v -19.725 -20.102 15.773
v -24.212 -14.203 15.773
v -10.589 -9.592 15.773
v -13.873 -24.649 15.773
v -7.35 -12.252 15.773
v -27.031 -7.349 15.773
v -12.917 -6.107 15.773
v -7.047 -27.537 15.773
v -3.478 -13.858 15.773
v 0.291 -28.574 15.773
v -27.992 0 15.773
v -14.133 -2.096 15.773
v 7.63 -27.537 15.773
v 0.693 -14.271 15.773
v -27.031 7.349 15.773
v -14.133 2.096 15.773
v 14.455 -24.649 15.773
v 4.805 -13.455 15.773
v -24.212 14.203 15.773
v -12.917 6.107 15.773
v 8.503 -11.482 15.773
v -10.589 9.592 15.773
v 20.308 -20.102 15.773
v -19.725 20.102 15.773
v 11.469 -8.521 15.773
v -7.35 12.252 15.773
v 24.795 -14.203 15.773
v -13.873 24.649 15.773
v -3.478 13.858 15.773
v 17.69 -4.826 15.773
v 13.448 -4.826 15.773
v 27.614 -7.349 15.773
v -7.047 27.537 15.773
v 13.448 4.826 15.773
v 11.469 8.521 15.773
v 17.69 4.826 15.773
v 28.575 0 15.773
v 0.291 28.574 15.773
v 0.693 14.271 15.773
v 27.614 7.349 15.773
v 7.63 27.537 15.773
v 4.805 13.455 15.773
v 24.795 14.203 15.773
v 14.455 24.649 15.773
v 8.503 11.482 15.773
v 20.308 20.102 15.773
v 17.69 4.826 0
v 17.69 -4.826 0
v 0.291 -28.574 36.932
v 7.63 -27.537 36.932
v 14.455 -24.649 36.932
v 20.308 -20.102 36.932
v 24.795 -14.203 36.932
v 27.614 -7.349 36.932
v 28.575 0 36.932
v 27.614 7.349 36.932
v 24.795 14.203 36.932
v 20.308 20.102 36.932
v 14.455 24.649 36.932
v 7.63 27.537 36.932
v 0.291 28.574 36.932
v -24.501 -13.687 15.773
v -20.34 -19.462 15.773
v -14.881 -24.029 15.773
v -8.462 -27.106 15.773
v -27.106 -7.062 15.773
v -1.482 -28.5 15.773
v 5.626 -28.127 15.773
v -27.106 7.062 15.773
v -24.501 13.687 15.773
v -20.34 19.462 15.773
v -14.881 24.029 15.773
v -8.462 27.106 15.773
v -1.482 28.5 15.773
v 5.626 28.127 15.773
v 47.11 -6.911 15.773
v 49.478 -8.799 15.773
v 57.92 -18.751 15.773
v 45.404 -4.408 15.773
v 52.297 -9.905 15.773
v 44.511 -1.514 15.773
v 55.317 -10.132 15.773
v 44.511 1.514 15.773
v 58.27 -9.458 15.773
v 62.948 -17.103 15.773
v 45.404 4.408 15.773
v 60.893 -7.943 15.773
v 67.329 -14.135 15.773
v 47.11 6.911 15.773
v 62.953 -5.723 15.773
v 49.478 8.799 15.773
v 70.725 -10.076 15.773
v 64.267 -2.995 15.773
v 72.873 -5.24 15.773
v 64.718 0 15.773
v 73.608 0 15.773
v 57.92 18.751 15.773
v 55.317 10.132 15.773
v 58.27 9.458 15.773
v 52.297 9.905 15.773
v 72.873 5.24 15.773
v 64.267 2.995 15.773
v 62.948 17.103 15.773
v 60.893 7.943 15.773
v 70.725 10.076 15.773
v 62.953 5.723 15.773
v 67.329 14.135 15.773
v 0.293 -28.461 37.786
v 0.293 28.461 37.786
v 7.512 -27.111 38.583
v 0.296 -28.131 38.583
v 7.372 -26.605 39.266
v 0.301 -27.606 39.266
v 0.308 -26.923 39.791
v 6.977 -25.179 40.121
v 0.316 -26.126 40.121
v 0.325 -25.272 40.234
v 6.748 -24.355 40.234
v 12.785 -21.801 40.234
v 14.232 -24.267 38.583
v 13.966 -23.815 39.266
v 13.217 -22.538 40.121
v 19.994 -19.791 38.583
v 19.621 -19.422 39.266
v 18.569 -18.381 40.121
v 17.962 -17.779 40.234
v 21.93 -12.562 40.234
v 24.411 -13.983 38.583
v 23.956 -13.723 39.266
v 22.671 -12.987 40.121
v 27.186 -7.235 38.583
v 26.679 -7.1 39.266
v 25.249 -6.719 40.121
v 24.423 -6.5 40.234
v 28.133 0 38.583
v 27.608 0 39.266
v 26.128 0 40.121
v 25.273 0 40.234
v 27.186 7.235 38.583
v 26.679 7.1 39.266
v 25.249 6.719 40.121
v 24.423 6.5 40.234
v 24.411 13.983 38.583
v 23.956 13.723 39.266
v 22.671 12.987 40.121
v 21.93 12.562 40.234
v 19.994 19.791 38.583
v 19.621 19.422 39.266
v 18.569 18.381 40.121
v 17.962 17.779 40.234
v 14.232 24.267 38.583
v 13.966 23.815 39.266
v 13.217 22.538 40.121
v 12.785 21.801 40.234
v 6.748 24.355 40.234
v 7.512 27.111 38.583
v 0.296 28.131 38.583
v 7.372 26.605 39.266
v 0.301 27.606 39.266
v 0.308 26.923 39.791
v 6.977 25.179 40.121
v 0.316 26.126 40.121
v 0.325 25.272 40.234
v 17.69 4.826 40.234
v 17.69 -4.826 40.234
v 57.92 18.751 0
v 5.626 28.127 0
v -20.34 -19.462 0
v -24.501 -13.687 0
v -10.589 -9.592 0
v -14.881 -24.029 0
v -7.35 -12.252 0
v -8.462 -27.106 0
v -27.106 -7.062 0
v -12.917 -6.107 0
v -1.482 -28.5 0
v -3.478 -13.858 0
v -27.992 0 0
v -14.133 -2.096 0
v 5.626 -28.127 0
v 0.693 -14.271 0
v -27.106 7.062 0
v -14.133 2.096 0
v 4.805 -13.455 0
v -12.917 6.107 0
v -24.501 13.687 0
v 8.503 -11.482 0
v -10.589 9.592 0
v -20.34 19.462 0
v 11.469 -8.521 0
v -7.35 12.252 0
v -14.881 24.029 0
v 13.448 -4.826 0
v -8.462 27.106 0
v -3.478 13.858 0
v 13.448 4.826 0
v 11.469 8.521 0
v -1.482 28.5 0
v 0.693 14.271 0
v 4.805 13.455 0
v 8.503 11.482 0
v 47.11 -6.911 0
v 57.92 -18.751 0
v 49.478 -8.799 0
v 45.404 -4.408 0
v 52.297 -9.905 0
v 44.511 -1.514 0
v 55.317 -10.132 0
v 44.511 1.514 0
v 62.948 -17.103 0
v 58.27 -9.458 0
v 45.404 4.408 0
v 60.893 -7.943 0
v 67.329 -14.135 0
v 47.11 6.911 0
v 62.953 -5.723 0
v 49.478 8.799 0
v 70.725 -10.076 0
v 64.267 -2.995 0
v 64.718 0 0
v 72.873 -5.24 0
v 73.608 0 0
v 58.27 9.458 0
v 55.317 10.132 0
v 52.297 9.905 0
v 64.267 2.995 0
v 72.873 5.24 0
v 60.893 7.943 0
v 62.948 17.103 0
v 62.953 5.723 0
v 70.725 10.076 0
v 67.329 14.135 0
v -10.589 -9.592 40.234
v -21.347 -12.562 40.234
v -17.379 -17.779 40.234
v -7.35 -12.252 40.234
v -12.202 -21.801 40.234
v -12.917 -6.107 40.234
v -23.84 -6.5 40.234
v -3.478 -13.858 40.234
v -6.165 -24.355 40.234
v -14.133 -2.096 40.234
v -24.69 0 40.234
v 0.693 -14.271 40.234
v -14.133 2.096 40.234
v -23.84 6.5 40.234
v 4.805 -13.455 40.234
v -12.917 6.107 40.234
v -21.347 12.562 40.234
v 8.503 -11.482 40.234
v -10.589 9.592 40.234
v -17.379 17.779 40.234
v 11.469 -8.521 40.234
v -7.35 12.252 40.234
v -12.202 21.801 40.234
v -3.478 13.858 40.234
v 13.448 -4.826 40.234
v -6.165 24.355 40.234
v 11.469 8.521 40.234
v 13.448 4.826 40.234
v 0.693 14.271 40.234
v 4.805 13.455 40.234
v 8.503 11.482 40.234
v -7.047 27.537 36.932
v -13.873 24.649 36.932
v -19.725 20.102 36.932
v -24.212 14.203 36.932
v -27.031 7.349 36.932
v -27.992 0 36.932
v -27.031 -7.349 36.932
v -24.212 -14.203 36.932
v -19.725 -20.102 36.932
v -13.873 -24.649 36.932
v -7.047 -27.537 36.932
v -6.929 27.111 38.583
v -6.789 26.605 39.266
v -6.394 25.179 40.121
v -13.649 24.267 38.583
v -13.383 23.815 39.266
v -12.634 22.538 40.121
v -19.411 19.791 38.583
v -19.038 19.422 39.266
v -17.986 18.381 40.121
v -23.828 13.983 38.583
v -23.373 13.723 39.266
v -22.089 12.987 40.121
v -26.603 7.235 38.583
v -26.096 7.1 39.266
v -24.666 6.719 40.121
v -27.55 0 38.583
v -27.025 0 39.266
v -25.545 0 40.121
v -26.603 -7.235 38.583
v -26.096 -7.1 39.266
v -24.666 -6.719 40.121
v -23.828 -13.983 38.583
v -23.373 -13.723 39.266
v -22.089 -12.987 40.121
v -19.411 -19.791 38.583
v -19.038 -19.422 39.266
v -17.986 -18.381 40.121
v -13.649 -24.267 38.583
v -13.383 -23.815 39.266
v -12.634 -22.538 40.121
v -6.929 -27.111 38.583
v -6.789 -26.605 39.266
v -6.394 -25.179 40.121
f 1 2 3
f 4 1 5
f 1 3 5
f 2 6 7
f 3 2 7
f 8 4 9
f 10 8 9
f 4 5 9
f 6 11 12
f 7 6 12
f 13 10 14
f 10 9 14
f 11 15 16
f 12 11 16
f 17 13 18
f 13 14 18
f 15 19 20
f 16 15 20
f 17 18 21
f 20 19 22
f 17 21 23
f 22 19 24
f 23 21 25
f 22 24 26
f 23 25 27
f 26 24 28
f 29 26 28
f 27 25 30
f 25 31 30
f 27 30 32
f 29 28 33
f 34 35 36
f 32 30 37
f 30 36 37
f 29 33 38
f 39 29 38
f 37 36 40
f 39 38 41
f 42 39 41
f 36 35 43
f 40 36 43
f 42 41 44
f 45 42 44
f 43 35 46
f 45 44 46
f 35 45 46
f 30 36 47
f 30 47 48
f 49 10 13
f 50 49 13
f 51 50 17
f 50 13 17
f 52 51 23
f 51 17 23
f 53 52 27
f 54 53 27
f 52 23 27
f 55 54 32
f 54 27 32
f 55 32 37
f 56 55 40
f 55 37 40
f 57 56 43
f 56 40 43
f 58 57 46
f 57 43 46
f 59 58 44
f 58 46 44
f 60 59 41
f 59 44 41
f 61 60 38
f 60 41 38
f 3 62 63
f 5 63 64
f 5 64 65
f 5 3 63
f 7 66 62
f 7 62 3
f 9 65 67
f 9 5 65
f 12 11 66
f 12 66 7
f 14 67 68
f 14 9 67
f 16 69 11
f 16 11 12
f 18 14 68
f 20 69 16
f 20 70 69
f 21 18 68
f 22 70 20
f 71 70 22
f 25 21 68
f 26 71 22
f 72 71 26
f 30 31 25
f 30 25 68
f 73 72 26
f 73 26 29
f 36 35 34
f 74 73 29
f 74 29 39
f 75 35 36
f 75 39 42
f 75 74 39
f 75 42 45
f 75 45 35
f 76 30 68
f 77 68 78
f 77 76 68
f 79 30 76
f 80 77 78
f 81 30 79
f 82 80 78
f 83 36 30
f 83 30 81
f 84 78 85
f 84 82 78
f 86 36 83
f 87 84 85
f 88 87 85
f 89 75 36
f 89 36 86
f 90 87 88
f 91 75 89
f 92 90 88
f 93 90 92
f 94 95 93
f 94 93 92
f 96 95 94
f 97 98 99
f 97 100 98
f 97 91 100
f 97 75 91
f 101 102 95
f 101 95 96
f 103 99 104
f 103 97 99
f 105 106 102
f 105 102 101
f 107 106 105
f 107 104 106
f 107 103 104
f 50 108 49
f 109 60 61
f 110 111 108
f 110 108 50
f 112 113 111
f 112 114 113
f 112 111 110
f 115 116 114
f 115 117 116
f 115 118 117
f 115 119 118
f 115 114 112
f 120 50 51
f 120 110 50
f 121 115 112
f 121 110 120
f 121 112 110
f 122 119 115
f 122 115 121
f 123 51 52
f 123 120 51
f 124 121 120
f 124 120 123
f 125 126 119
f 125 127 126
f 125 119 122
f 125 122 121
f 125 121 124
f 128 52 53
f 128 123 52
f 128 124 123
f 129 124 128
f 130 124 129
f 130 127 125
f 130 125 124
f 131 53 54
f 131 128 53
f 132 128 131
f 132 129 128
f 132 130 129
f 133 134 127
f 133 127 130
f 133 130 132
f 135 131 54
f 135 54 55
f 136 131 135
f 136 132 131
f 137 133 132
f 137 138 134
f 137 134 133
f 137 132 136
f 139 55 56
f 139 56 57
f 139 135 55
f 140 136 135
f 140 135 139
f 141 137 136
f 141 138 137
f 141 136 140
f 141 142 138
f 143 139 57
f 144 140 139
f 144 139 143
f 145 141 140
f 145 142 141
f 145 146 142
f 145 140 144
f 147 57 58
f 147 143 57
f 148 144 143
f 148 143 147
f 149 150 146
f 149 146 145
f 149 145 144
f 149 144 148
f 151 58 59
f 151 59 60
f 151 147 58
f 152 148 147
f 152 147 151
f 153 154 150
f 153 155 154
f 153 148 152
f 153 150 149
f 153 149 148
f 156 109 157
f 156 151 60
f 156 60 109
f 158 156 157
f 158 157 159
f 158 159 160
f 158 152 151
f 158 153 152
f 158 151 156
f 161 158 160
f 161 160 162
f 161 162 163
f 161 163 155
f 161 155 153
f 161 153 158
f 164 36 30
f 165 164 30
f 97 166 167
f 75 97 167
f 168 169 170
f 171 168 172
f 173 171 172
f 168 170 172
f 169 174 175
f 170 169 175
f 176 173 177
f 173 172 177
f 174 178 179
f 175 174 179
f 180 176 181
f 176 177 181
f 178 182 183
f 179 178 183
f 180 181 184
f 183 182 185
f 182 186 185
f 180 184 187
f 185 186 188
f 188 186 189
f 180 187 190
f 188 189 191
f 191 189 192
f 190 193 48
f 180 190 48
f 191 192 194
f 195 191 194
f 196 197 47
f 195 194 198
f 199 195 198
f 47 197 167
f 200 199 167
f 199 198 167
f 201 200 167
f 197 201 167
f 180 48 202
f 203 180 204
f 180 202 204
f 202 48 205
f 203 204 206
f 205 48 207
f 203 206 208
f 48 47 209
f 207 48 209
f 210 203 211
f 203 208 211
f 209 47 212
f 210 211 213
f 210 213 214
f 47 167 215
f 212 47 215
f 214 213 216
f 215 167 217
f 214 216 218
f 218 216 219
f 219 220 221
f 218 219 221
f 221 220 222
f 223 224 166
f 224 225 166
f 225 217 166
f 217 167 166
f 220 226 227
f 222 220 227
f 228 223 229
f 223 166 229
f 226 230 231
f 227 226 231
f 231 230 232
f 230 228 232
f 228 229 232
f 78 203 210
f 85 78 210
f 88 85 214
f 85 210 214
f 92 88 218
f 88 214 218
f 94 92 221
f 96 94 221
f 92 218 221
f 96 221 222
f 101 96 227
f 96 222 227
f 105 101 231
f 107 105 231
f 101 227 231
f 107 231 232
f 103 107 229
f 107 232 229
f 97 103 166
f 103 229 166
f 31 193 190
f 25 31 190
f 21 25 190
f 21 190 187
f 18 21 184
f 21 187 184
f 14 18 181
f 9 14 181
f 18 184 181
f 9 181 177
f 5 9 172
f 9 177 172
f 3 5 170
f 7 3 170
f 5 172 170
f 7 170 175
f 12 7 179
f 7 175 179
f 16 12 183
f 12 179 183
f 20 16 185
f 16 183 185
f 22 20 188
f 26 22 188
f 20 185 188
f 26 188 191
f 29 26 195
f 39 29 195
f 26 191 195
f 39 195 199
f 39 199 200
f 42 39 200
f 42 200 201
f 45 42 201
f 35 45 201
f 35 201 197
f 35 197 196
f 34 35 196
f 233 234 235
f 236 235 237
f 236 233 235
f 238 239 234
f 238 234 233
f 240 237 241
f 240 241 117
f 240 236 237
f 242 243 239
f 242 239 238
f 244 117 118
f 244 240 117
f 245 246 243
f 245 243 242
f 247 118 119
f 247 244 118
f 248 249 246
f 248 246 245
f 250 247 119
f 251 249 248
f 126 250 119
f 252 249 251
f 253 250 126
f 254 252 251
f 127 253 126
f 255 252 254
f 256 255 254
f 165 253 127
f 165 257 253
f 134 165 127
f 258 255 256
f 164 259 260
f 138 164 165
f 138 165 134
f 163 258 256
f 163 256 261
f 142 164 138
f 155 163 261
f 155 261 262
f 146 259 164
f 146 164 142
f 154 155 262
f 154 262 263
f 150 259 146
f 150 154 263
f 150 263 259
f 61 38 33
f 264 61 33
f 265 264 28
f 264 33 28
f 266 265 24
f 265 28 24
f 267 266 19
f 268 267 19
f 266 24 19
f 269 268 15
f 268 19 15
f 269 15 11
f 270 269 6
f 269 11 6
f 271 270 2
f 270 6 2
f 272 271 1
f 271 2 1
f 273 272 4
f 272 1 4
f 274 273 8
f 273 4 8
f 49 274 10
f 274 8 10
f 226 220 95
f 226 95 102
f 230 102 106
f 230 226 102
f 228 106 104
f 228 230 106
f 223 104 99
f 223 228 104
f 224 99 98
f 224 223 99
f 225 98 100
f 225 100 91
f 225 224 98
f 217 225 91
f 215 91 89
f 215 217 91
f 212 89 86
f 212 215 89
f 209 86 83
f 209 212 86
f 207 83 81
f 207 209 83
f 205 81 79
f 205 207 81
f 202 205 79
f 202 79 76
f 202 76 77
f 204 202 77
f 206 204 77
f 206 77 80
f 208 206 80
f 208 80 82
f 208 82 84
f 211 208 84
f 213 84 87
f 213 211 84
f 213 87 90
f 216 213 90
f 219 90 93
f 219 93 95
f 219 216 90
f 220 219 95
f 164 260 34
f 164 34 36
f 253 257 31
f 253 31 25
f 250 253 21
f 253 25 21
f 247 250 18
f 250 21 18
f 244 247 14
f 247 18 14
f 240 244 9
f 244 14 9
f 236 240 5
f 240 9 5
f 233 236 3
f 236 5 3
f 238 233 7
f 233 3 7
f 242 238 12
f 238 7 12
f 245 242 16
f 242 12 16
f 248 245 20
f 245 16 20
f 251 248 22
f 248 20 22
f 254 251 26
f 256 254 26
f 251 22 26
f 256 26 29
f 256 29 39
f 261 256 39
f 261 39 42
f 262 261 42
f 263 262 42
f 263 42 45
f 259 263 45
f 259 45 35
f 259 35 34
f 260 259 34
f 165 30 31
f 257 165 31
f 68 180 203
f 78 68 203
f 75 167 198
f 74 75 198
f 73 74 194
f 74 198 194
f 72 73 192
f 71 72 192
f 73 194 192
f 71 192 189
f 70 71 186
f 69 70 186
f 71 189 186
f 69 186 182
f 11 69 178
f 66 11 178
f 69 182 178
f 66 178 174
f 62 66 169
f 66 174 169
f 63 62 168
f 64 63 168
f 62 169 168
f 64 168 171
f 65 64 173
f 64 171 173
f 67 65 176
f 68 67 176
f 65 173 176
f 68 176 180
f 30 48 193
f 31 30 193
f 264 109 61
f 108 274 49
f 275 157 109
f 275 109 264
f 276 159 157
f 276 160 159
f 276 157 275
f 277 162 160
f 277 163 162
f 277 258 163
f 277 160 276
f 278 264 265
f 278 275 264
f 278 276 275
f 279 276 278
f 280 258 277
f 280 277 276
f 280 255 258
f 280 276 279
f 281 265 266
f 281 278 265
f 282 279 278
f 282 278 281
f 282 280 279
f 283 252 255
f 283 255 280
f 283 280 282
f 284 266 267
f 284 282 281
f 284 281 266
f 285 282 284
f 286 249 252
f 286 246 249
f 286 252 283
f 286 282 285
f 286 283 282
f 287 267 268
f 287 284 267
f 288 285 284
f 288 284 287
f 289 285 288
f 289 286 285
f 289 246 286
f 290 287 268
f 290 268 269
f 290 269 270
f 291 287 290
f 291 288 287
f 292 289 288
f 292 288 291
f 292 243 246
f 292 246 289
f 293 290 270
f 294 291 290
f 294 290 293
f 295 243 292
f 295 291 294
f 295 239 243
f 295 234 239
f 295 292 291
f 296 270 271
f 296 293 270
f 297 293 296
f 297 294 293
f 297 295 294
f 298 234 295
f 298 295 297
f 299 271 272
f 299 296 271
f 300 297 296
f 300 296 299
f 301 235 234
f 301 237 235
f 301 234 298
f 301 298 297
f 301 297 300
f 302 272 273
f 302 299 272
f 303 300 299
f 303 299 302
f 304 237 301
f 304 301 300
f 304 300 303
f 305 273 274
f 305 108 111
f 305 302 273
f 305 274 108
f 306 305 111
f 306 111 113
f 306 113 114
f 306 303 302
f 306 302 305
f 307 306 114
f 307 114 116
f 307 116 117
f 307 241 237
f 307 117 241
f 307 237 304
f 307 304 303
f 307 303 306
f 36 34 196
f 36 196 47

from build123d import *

# Parameters (mm, degrees)
F0_R     = 10.16
F1_DEPTH = 15.7734
F3_DEPTH = 24.4602
F4_R     = 3.302


with BuildPart() as f1:
    # F0 (on Top) → F1 (new body)
    with BuildSketch(Plane.XY):
        with BuildLine():
            ThreePointArc((5.6256016141, 28.1265414802), (22.4989791116, 18.3362616868), (29.1579545553, 0))
            ThreePointArc((29.1579545553, 0), (27.2095111336, -10.3709743893), (21.6298978776, -19.3276175921))
            ThreePointArc((21.6298978776, -19.3276175921), (14.3496515797, -25.0401413343), (5.6256016141, -28.1265414802))
            Line((5.6256016141, -28.1265414802), (57.9197192612, -18.7510276535))
            ThreePointArc((57.9197192612, -18.7510276535), (73.6079545553, 0), (57.9197192612, 18.7510276535))
            Line((57.9197192612, 18.7510276535), (5.6256016141, 28.1265414802))
        make_face()
        with Locations((54.5579545553, 0)):
            Circle(F0_R, mode=Mode.SUBTRACT)
        with BuildLine():
            ThreePointArc((21.6298978776, -19.3276175921), (27.2095111336, -10.3709743893), (29.1579545553, 0))
            ThreePointArc((29.1579545553, 0), (22.4989791116, 18.3362616868), (5.6256016141, 28.1265414802))
            ThreePointArc((5.6256016141, 28.1265414802), (-27.9920454447, 0), (5.6256016141, -28.1265414802))
            ThreePointArc((5.6256016141, -28.1265414802), (14.3496515797, -25.0401413343), (21.6298978776, -19.3276175921))
        make_face()
        with BuildLine():
            ThreePointArc((13.4477648793, -4.826), (-14.2875, 0), (13.4477648793, 4.826))
            Line((13.4477648793, 4.826), (17.6895648793, 4.826))
            Line((17.6895648793, 4.826), (17.6895648793, -4.826))
            Line((17.6895648793, -4.826), (13.4477648793, -4.826))
        make_face(mode=Mode.SUBTRACT)
    extrude(amount=F1_DEPTH)


with BuildPart() as f3:
    # F2 (on face) → F3 (new body)
    with BuildSketch(Plane.XY.offset(15.7734)):
        with BuildLine():
            ThreePointArc((0.2914772776, -28.5735133646), (20.3083675884, -20.102259348), (28.575, 0))
            ThreePointArc((28.575, 0), (20.3083675884, 20.102259348), (0.2914772776, 28.5735133646))
            ThreePointArc((0.2914772776, 28.5735133646), (-27.9920454447, 0), (0.2914772776, -28.5735133646))
        make_face()
        with BuildLine():
            Line((17.6895648793, 4.826), (17.6895648793, -4.826))
            Line((17.6895648793, -4.826), (13.4477648793, -4.826))
            ThreePointArc((13.4477648793, -4.826), (-14.2875, 0), (13.4477648793, 4.826))
            Line((13.4477648793, 4.826), (17.6895648793, 4.826))
        make_face(mode=Mode.SUBTRACT)
    extrude(amount=F3_DEPTH)

    # F4
    f4_edges = [f3.edges().sort_by_distance(p)[0] for p in [
        (-27.992045, 0, 40.2336),
        (28.575, 0, 40.2336),
    ]]
    fillet(f4_edges, radius=F4_R)


solid = Compound([f1.part, f3.part])
